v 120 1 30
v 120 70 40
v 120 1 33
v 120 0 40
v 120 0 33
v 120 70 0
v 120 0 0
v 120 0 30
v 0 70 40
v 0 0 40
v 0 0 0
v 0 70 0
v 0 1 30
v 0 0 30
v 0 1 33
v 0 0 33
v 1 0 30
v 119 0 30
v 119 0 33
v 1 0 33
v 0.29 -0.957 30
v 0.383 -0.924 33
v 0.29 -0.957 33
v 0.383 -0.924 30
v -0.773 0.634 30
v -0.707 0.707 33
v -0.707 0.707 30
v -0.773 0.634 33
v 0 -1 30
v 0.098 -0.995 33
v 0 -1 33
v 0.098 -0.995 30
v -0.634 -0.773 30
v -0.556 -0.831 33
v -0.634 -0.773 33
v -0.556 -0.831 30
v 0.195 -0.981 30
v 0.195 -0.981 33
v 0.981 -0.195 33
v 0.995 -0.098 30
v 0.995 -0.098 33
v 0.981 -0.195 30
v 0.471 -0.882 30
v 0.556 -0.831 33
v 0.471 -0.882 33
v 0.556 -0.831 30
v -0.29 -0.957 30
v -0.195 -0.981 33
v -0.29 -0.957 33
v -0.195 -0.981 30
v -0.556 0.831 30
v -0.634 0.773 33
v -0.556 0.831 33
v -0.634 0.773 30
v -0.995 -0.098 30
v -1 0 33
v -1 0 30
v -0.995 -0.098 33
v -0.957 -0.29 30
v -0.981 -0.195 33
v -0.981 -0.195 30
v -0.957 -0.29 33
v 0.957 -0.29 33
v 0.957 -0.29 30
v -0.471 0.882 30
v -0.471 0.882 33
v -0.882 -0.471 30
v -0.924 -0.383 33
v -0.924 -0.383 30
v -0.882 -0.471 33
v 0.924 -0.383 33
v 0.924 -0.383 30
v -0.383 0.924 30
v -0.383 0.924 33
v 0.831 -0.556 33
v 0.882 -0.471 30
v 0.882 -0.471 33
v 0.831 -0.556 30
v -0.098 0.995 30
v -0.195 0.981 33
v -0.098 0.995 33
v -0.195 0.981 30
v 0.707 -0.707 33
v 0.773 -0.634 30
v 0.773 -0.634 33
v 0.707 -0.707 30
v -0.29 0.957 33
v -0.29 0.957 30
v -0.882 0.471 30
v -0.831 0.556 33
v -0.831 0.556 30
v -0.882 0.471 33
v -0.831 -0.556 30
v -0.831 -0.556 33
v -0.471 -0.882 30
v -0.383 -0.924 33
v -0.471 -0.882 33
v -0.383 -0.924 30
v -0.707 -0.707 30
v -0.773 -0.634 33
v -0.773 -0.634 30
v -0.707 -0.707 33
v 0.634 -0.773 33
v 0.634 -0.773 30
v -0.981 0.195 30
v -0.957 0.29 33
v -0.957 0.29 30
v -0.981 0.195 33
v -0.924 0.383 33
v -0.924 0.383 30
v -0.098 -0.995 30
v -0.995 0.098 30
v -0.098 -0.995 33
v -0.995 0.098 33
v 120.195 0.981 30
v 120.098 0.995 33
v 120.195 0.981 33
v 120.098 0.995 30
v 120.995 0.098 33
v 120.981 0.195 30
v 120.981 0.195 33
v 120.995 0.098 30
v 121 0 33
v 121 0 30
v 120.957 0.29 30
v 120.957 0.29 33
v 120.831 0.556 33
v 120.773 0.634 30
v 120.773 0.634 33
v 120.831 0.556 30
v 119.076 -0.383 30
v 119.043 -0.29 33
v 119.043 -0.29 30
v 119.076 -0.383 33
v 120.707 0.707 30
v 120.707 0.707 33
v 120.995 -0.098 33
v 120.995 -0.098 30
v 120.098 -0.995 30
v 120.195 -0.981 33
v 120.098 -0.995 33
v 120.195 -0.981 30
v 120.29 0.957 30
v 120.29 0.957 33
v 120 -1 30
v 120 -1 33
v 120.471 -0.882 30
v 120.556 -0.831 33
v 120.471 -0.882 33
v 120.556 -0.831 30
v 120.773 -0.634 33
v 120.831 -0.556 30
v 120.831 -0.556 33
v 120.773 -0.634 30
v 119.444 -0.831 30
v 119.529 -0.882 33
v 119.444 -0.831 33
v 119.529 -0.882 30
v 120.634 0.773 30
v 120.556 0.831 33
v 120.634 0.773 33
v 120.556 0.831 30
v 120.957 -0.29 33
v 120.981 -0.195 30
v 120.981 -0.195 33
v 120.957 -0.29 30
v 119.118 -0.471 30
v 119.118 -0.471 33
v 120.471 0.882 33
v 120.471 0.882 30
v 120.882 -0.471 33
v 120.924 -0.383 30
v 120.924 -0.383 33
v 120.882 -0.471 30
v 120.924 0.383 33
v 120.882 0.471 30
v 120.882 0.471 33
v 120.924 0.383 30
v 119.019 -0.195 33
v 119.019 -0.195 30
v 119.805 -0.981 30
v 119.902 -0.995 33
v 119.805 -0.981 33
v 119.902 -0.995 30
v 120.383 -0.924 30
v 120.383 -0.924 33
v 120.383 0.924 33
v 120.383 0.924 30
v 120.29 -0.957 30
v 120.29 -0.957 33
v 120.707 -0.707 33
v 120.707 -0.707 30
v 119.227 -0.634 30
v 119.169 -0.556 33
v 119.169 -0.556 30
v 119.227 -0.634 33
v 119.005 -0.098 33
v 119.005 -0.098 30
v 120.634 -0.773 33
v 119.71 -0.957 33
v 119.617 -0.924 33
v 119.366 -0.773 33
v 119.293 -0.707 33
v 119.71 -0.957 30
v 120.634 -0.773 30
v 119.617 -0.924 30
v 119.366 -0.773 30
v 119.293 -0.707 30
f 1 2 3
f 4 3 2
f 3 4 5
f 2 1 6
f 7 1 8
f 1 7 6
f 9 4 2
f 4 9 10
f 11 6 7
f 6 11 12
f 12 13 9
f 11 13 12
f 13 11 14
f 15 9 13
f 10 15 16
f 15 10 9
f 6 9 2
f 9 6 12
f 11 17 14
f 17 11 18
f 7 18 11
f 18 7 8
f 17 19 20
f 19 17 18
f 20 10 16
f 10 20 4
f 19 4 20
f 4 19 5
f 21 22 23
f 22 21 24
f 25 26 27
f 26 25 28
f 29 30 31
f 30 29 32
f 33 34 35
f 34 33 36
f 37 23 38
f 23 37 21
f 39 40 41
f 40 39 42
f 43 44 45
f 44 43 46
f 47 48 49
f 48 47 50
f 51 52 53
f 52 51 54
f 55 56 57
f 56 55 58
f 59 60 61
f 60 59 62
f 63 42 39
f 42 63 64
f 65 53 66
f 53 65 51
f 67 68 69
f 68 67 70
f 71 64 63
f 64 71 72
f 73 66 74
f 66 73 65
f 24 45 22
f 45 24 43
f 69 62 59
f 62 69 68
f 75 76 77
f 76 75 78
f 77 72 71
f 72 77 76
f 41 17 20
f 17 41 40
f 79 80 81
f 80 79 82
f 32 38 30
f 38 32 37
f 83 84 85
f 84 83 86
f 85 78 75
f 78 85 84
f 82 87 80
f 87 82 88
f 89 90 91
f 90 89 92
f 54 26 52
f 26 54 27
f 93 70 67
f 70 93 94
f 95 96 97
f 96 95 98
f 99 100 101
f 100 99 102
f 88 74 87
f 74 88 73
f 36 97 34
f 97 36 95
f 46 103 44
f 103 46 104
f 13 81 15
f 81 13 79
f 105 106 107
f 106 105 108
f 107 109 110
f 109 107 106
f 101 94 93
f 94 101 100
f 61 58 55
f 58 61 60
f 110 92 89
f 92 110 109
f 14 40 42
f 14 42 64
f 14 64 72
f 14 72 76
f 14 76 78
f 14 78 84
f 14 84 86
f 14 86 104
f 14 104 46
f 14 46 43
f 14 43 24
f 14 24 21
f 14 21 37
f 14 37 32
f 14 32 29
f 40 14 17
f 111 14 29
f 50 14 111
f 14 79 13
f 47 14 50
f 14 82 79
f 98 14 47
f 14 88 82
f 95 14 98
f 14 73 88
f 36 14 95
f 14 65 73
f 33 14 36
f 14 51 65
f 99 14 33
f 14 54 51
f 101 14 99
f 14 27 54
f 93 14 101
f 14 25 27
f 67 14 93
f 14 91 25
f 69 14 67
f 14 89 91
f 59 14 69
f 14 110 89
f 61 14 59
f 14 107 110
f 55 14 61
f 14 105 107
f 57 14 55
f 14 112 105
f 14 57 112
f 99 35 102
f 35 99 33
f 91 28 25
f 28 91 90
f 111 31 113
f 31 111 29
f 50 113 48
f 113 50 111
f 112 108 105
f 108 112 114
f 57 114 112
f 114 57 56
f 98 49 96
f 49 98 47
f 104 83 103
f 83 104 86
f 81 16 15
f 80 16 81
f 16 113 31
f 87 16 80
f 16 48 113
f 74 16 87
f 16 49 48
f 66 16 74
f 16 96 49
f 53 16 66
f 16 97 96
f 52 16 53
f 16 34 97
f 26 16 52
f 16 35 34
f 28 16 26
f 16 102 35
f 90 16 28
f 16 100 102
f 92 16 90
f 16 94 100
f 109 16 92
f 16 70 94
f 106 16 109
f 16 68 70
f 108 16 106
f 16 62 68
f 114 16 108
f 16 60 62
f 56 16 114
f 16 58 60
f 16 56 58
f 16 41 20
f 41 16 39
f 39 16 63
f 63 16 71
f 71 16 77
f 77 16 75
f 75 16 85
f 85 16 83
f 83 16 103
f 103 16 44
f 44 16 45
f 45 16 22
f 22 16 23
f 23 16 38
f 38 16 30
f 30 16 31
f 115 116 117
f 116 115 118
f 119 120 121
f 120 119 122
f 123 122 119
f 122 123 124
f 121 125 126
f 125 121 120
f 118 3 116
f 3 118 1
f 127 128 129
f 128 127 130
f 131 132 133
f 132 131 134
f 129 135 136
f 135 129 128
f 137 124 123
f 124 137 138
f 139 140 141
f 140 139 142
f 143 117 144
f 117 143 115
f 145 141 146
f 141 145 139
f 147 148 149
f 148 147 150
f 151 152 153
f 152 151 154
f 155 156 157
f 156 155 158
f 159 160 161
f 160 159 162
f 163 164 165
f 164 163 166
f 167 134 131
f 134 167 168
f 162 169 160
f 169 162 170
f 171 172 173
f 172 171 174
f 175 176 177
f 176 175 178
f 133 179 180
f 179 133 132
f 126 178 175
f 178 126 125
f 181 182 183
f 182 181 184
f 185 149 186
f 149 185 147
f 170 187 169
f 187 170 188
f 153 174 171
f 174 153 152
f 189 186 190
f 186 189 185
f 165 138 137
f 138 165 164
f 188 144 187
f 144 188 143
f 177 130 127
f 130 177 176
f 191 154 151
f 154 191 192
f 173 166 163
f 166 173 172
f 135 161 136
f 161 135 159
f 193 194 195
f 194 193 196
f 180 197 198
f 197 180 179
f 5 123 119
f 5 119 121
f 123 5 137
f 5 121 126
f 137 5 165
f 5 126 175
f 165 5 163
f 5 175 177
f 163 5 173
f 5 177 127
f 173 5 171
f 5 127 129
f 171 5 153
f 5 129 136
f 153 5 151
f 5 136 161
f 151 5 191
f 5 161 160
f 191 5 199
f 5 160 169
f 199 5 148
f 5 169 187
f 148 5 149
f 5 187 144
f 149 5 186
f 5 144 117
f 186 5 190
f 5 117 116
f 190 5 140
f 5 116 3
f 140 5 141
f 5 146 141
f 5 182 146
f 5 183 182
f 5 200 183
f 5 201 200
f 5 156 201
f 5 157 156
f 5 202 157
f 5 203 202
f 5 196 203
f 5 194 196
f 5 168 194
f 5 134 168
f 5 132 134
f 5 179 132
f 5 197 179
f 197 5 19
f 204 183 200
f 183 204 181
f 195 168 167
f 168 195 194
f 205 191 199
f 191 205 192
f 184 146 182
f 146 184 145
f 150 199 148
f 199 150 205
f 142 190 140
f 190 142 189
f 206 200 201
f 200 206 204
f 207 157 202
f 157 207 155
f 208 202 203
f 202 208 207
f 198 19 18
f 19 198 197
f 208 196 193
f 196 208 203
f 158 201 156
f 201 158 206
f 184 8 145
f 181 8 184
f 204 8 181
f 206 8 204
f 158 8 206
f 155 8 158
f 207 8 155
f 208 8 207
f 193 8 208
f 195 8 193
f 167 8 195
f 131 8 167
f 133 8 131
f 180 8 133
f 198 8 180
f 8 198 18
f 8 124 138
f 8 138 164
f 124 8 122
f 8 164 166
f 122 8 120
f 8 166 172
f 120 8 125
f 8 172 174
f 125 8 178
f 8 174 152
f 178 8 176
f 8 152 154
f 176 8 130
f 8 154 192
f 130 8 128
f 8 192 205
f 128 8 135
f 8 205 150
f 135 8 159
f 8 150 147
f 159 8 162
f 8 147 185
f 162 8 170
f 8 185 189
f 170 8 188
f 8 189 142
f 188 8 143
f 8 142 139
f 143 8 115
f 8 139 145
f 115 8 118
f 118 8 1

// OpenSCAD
// Dimensions in millimetres
outer_x = 120;
outer_y = 70;
outer_z = 40;

wall_thickness = 3;
floor_thickness = 3;

platform_length = 60;
platform_width = outer_y;  // spans full Y
platform_height_above_floor = 10;  // top of platform at z = 13 (floor at z = 3)

hole_diameter = 2;
hole_radius = hole_diameter / 2;
hole_y = 0;  // along Y=0 edge
hole_z = 30;  // at z = 30

// Set resolution for smooth curves
$fn = 64;

// Main tank body (outer box with walls and floor)
// Adjust to ensure base is at z = 0 and the tank builds upward from z = 0
// The original model was centered at origin, but we need the bottom to be at z = 0
// So we shift the entire model so that the bottom of the floor is at z = 0

// Inner dimensions
inner_x = outer_x - 2 * wall_thickness;
inner_y = outer_y - 2 * wall_thickness;
inner_z = outer_z - floor_thickness;

// Platform is centred in X
platform_x_center = 0;  // we'll center it in X

// Define the origin at the bottom of the tank (z = 0), so we shift everything up by outer_z/2 - outer_z + floor_thickness?
// Actually: we want the bottom of the tank at z = 0.
// The original cube was centered at (0,0,0) with height 40 mm → from -20 to +20.
// We want it from 0 to 40 → so we shift up by 20 mm.

// But we want the floor to be at z = 0, and the tank to go up to z = 40.
// So we shift the entire model up by 20 mm.

// However, we must ensure that:
// - The floor is at z = 0
// - The platform top is at z = 13 (since floor is 3 mm thick → z = 3 is floor top, platform top at z = 13)
// - The hole is at z = 30

// So we define the model with base at z = 0.

module tank_body() {
    // Outer box from z = 0 to z = 40
    cube([outer_x, outer_y, outer_z], center = false);
    
    // Cut out the inner cavity (walls and floor)
    difference() {
        cube([outer_x, outer_y, outer_z], center = false);
        
        // Inner cavity: from z = 0 to z = outer_z - floor_thickness = 37 mm
        // But we need to subtract a box that is inner_x, inner_y, and height = outer_z - floor_thickness
        // But we want the floor to be 3 mm thick → so inner cavity height is 37 mm
        translate([0, 0, 0]) {
            cube([inner_x, inner_y, outer_z - floor_thickness], center = false);
        }
    }
}

// Platform for gel tray (raised solid in the middle)
// Platform top at z = 13 (since floor is 3 mm thick → z = 3 is floor top)
// Platform is 3 mm thick (same as wall) and spans full Y
module platform() {
    // Platform is centered in X and Y
    translate([
        (outer_x - platform_length) / 2,  // center in X: offset from left
        0,  // centered in Y
        floor_thickness + platform_height_above_floor  // z = 3 + 10 = 13
    ]) {
        cube([platform_length, platform_width, wall_thickness], center = false);
    }
}

// Horizontal holes through end walls (X=±outer_x/2) at y=0, z=30
// The hole is drilled through the end wall (in X direction), so it's a hole through the wall at X = ±60 mm
// We drill from the outer face of the wall (X = ±60) inward, so the hole is centered at X = ±60, Y = 0, Z = 30
// The hole is 2 mm diameter, and we drill through the wall (3 mm thick), so we need a cylinder of length 3 mm (in X direction)
// But since the wall is 3 mm thick, we drill a cylinder of length 3 mm, centered at the wall face

module electrode_holes() {
    // Left hole: at X = 0 (left face of tank) → X = 0, Y = 0, Z = 30
    // The wall is at X = 0 (left) and X = 120 (right) → so left wall is at X = 0
    // We drill from X = 0 to X = 3 (into the tank), so cylinder from X = 0 to X = 3, centered at X = 1.5
    // But we want the hole to go through the wall at X = 0, so we place the cylinder at X = 0, and extend 3 mm inward (in +X direction)
    // So: cylinder from X = 0 to X = 3, centered at X = 1.5 → but we can just place it at X = 0 and extend 3 mm in +X

    // Left hole: at X = 0, Y = 0, Z = 30
    translate([
        0,  // X = 0 (left wall face)
        0,  // Y = 0
        hole_z  // Z = 30
    ]) {
        cylinder(h = wall_thickness, r = hole_radius, center = false, $fn = 64);
    }

    // Right hole: at X = 120 (right wall face)
    translate([
        outer_x,  // X = 120 (right wall face)
        0,  // Y = 0
        hole_z  // Z = 30
    ]) {
        cylinder(h = wall_thickness, r = hole_radius, center = false, $fn = 64);
    }
}

// Assemble the complete buffer tank, with base at z = 0
// We do not need to shift the entire model because we're building from z = 0
// The tank body is built from z = 0 to z = 40, with floor at z = 0, and the platform at z = 13

// However, the original model was centered at origin. We now build it from z = 0.
// So we must ensure all parts are placed correctly relative to z = 0.

// The only issue was the original model was centered at origin (z from -20 to +20), but we now build from z = 0 to 40.
// So we don't need to shift — we just build everything from z = 0.

// But the platform and holes are correctly placed relative to z = 0.

// Final model:
tank_body();
platform();
electrode_holes();
